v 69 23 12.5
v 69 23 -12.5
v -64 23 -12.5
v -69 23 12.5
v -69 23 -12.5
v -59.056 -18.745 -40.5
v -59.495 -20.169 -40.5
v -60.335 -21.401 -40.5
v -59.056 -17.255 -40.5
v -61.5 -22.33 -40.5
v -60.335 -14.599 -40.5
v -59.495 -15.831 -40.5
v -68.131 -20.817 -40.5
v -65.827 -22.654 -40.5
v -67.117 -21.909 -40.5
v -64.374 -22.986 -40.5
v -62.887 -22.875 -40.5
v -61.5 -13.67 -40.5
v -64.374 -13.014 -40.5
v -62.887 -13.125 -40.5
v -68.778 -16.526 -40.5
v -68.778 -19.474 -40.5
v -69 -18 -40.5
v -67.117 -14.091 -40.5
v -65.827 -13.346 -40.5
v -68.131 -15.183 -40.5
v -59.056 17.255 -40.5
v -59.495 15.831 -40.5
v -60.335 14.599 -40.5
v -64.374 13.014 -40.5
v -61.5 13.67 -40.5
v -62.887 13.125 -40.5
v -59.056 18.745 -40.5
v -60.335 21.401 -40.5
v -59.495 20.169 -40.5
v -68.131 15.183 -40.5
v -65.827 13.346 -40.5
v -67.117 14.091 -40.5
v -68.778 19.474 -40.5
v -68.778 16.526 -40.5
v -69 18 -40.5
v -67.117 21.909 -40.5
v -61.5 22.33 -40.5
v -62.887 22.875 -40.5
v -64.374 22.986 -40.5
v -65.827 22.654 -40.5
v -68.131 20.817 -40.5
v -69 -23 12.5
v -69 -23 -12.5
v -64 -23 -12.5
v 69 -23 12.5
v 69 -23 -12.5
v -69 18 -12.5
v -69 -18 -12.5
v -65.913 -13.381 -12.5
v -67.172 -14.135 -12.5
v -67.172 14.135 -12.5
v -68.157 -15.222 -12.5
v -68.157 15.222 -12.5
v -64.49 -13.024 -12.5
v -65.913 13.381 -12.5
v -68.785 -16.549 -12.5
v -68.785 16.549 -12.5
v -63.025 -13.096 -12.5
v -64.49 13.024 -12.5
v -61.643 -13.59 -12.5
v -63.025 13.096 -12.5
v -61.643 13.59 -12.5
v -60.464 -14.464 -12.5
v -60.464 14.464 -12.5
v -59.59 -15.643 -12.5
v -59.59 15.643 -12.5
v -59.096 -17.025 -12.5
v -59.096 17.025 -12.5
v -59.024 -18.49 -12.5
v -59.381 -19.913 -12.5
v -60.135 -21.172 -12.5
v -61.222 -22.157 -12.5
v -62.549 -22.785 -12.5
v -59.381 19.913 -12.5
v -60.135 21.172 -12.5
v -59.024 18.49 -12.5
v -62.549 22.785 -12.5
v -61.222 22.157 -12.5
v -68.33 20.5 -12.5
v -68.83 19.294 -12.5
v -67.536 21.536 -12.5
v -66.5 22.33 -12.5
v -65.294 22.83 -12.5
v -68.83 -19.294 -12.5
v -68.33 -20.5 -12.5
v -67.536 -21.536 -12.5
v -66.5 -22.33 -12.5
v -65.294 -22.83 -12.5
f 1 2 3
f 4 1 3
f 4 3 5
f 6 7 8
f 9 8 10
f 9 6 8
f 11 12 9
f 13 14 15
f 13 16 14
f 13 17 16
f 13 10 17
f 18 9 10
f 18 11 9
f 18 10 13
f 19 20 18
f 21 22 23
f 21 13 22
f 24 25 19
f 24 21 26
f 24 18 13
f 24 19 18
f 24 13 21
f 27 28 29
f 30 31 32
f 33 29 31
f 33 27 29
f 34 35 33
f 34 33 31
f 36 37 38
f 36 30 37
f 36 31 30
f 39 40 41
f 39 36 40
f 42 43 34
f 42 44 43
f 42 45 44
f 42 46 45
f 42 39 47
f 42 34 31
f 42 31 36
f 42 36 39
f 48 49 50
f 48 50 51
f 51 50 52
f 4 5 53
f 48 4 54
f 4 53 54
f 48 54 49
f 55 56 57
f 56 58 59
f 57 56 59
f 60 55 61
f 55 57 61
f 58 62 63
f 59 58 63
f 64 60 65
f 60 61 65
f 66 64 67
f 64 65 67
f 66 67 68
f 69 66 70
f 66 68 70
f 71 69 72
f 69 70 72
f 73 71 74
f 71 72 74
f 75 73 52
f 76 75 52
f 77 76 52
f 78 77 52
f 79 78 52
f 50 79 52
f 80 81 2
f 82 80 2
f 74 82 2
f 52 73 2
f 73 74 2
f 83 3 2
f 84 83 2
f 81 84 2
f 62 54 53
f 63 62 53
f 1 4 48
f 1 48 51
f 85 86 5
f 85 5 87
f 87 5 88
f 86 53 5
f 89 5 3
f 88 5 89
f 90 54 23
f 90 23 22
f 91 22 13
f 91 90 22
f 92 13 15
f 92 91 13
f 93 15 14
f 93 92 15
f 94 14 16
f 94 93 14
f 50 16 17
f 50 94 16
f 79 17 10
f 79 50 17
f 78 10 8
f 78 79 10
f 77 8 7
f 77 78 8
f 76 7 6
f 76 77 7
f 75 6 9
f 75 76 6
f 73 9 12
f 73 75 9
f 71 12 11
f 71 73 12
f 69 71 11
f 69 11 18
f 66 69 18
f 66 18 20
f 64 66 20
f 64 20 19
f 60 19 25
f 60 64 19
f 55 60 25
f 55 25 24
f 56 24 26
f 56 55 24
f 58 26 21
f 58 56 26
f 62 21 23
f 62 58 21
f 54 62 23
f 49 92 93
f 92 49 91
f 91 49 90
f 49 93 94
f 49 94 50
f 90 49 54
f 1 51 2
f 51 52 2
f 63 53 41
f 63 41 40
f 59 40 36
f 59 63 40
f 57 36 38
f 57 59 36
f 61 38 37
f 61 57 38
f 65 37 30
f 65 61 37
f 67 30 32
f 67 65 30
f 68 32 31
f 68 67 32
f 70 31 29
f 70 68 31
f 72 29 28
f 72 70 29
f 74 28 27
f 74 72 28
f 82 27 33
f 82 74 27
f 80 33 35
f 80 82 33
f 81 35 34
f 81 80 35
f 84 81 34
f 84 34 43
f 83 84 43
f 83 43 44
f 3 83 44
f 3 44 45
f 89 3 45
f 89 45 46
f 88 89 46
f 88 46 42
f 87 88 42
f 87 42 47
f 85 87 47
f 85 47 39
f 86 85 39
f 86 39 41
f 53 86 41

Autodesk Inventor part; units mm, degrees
ref_plane "YZ Plane" through (0, 0, 0) normal (1, 0, 0) x (0, 1, 0)
ref_plane "XZ Plane" through (0, 0, 0) normal (0, 1, 0) x (-1, 0, 0)
ref_plane "XY Plane" through (0, 0, 0) normal (0, 0, 1) x (1, 0, 0)
sketch "Szkic1" plane through (0, 0, 0) normal (0, 0, 1) x (1, 0, 0)
  line L0 (-69, -23) -> (69, -23)
  line L1 (69, -23) -> (69, 23)
  line L2 (69, 23) -> (-69, 23)
  line L3 (-69, 23) -> (-69, -23)
  line L4 (-69, -23) -> (69, 23) construction
  line L5 (69, -23) -> (-69, 23) construction
  point P0 (0, 0)
  dimension "d0" = 138
  dimension "d1" = 46
extrude "Wyciągnięcie proste1" add sketch "Szkic1" along normal mid plane 25
sketch "Szkic2" plane through (0, 0, -12.5) normal (0, 0, -1) x (-1, 0, 0)
  line L0 (-69, -23) -> (69, -23) projected
  line L1 (69, -23) -> (69, 23) projected
  line L2 (69, 23) -> (-69, 23) projected
  line L3 (-69, 23) -> (-69, -23) projected
  circle A0 centre (64, -18) radius 5
  circle A1 centre (64, 18) radius 5
  line L4 (-69, -23) -> (69, -23) projected
  line L5 (69, -23) -> (69, 23) projected
  line L6 (69, 23) -> (-69, 23) projected
  point P0 (0, 0)
  dimension "d4" = 10
  dimension "d5" = 10
extrude "Wyciągnięcie proste2" add sketch "Szkic2" along normal blind 28 contours A0 | A1
equation "\"d5\" = d4"
properties part number "lipol_6000"
